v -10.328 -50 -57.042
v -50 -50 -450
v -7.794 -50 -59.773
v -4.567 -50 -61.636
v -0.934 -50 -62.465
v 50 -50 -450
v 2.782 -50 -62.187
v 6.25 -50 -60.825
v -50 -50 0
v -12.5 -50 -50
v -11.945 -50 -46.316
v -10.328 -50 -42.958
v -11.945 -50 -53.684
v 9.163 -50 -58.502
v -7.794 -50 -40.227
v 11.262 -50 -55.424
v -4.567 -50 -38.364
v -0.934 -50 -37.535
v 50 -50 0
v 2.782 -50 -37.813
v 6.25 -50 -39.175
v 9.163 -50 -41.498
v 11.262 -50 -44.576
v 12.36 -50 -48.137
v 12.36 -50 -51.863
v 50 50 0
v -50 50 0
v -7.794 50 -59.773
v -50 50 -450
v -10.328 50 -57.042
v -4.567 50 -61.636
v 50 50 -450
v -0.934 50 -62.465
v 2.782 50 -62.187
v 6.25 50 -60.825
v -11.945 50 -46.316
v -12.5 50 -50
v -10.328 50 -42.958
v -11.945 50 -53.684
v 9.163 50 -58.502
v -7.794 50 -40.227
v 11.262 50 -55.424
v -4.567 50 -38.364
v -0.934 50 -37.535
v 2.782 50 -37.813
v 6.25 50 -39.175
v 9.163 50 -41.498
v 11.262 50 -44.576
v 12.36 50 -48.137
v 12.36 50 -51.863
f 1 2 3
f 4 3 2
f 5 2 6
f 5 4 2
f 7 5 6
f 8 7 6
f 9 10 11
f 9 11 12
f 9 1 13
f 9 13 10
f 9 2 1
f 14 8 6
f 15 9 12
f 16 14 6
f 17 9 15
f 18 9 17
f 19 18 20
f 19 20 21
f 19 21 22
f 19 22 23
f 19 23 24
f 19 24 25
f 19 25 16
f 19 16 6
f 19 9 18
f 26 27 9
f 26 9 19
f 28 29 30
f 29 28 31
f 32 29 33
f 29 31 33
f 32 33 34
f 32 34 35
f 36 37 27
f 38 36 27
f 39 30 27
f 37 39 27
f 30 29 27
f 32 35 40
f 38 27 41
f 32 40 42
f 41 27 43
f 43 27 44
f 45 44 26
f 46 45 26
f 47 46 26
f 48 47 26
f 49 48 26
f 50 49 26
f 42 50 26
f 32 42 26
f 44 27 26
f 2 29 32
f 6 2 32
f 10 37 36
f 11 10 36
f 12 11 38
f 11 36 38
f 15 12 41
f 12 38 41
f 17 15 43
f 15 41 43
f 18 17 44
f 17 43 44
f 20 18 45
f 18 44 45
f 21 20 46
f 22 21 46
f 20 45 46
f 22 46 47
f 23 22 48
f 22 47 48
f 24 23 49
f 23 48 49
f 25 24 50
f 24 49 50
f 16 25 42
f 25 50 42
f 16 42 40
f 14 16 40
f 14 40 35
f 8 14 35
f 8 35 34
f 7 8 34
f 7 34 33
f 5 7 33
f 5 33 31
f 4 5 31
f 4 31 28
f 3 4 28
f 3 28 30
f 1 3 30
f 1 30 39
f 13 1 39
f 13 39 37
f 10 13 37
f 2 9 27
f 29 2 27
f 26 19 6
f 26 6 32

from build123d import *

# Parameters (mm, degrees)
SKETCH2_W           = 100
SKETCH2_H           = 100
BOSS_EXTRUDE1_DEPTH = 450
SKETCH3_R           = 12.5
CUT_EXTRUDE1_DEPTH  = 500


with BuildPart() as part:
    # Sketch2 → Boss-Extrude1 (new body)
    with BuildSketch(Plane.XY):
        Rectangle(SKETCH2_W, SKETCH2_H)
    extrude(amount=-BOSS_EXTRUDE1_DEPTH)

    # Sketch3 → Cut-Extrude1 (cut)
    with BuildSketch(Plane(origin=(0, 50, 0), x_dir=(1, 0, 0), z_dir=(0, 1, 0))):
        with Locations(Location((0, 50, 0), (0, 0, 180))):
            Circle(SKETCH3_R)
    extrude(amount=-CUT_EXTRUDE1_DEPTH, mode=Mode.SUBTRACT)


solid = part.part
